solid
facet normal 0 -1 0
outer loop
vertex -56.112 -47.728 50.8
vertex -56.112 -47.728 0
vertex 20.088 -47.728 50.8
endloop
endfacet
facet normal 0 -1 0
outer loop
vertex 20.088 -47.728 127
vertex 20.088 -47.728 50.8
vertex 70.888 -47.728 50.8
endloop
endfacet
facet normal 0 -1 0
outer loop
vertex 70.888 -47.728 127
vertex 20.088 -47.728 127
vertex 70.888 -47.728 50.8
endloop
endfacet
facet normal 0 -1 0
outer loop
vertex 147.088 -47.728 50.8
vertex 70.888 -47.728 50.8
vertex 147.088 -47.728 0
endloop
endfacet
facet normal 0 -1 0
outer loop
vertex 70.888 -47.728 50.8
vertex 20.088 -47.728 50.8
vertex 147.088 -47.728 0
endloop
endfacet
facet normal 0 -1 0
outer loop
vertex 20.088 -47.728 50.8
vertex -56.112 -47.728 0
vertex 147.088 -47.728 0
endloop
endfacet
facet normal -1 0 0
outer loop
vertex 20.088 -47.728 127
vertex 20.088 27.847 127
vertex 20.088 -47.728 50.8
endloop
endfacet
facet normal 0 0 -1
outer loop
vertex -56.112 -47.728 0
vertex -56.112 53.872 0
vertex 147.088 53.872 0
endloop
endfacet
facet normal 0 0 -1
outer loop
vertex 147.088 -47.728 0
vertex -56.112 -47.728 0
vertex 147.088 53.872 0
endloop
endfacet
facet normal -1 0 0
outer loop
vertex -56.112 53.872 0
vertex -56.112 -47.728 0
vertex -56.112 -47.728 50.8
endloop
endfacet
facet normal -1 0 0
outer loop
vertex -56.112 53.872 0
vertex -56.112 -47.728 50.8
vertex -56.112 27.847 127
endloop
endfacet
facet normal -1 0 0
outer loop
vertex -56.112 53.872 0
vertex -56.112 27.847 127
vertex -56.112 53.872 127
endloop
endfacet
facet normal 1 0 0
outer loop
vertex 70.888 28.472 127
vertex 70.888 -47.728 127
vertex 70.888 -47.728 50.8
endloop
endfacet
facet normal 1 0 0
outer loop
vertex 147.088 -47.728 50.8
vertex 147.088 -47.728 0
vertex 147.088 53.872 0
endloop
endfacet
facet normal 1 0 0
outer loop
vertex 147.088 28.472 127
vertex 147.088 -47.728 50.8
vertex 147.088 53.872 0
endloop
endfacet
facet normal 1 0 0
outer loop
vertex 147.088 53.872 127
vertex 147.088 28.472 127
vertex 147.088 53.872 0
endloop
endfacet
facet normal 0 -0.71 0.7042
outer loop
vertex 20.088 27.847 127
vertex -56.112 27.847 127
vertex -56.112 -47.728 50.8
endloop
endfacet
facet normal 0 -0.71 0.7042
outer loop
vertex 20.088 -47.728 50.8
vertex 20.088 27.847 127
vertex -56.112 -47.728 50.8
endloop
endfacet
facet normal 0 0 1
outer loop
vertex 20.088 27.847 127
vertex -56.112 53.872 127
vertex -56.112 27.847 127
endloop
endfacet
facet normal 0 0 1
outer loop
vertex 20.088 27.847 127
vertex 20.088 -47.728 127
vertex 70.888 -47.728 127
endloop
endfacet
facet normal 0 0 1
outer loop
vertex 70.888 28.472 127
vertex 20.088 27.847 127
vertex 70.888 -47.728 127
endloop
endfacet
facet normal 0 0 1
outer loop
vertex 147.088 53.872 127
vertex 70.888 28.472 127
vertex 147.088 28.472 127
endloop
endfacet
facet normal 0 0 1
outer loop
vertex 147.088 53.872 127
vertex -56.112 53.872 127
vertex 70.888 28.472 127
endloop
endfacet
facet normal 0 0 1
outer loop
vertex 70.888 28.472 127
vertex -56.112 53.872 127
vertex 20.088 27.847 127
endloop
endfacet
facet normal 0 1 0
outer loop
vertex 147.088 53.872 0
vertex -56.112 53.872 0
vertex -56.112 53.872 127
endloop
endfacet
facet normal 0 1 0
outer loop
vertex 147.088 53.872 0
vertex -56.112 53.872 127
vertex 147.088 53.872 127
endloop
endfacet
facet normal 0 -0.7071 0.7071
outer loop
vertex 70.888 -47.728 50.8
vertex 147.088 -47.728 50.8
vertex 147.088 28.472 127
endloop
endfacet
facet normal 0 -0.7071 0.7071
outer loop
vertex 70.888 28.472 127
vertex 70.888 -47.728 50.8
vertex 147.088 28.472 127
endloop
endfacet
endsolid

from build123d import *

# Parameters (mm, degrees)
F4_W     = 203.2
F4_H     = 101.6
F5_DEPTH = 127
F1_DEPTH = 76.2
F3_DEPTH = 76.2


with BuildPart() as f5:
    # F4 (on Top) → F5 (new body)
    with BuildSketch(Plane.XY):
        with Locations((45.487865, 3.072385)):
            Rectangle(F4_W, F4_H)
    extrude(amount=F5_DEPTH)

    # F0 (on face) → F1 (cut)
    with BuildSketch(Plane.YZ.offset(147.087865)):
        Polygon((-47.727615, 50.8), (28.472385, 127), (-47.727615, 127), align=None)
    extrude(amount=-F1_DEPTH, mode=Mode.SUBTRACT)

    # F2 (on face) → F3 (cut)
    with BuildSketch(Plane(origin=(-56.112135, 0, 0), x_dir=(0, -1, 0), z_dir=(-1, 0, 0))):
        Polygon((-27.847318, 127), (47.727615, 50.8), (47.727615, 127), align=None)
    extrude(amount=-F3_DEPTH, mode=Mode.SUBTRACT)


solid = f5.part
